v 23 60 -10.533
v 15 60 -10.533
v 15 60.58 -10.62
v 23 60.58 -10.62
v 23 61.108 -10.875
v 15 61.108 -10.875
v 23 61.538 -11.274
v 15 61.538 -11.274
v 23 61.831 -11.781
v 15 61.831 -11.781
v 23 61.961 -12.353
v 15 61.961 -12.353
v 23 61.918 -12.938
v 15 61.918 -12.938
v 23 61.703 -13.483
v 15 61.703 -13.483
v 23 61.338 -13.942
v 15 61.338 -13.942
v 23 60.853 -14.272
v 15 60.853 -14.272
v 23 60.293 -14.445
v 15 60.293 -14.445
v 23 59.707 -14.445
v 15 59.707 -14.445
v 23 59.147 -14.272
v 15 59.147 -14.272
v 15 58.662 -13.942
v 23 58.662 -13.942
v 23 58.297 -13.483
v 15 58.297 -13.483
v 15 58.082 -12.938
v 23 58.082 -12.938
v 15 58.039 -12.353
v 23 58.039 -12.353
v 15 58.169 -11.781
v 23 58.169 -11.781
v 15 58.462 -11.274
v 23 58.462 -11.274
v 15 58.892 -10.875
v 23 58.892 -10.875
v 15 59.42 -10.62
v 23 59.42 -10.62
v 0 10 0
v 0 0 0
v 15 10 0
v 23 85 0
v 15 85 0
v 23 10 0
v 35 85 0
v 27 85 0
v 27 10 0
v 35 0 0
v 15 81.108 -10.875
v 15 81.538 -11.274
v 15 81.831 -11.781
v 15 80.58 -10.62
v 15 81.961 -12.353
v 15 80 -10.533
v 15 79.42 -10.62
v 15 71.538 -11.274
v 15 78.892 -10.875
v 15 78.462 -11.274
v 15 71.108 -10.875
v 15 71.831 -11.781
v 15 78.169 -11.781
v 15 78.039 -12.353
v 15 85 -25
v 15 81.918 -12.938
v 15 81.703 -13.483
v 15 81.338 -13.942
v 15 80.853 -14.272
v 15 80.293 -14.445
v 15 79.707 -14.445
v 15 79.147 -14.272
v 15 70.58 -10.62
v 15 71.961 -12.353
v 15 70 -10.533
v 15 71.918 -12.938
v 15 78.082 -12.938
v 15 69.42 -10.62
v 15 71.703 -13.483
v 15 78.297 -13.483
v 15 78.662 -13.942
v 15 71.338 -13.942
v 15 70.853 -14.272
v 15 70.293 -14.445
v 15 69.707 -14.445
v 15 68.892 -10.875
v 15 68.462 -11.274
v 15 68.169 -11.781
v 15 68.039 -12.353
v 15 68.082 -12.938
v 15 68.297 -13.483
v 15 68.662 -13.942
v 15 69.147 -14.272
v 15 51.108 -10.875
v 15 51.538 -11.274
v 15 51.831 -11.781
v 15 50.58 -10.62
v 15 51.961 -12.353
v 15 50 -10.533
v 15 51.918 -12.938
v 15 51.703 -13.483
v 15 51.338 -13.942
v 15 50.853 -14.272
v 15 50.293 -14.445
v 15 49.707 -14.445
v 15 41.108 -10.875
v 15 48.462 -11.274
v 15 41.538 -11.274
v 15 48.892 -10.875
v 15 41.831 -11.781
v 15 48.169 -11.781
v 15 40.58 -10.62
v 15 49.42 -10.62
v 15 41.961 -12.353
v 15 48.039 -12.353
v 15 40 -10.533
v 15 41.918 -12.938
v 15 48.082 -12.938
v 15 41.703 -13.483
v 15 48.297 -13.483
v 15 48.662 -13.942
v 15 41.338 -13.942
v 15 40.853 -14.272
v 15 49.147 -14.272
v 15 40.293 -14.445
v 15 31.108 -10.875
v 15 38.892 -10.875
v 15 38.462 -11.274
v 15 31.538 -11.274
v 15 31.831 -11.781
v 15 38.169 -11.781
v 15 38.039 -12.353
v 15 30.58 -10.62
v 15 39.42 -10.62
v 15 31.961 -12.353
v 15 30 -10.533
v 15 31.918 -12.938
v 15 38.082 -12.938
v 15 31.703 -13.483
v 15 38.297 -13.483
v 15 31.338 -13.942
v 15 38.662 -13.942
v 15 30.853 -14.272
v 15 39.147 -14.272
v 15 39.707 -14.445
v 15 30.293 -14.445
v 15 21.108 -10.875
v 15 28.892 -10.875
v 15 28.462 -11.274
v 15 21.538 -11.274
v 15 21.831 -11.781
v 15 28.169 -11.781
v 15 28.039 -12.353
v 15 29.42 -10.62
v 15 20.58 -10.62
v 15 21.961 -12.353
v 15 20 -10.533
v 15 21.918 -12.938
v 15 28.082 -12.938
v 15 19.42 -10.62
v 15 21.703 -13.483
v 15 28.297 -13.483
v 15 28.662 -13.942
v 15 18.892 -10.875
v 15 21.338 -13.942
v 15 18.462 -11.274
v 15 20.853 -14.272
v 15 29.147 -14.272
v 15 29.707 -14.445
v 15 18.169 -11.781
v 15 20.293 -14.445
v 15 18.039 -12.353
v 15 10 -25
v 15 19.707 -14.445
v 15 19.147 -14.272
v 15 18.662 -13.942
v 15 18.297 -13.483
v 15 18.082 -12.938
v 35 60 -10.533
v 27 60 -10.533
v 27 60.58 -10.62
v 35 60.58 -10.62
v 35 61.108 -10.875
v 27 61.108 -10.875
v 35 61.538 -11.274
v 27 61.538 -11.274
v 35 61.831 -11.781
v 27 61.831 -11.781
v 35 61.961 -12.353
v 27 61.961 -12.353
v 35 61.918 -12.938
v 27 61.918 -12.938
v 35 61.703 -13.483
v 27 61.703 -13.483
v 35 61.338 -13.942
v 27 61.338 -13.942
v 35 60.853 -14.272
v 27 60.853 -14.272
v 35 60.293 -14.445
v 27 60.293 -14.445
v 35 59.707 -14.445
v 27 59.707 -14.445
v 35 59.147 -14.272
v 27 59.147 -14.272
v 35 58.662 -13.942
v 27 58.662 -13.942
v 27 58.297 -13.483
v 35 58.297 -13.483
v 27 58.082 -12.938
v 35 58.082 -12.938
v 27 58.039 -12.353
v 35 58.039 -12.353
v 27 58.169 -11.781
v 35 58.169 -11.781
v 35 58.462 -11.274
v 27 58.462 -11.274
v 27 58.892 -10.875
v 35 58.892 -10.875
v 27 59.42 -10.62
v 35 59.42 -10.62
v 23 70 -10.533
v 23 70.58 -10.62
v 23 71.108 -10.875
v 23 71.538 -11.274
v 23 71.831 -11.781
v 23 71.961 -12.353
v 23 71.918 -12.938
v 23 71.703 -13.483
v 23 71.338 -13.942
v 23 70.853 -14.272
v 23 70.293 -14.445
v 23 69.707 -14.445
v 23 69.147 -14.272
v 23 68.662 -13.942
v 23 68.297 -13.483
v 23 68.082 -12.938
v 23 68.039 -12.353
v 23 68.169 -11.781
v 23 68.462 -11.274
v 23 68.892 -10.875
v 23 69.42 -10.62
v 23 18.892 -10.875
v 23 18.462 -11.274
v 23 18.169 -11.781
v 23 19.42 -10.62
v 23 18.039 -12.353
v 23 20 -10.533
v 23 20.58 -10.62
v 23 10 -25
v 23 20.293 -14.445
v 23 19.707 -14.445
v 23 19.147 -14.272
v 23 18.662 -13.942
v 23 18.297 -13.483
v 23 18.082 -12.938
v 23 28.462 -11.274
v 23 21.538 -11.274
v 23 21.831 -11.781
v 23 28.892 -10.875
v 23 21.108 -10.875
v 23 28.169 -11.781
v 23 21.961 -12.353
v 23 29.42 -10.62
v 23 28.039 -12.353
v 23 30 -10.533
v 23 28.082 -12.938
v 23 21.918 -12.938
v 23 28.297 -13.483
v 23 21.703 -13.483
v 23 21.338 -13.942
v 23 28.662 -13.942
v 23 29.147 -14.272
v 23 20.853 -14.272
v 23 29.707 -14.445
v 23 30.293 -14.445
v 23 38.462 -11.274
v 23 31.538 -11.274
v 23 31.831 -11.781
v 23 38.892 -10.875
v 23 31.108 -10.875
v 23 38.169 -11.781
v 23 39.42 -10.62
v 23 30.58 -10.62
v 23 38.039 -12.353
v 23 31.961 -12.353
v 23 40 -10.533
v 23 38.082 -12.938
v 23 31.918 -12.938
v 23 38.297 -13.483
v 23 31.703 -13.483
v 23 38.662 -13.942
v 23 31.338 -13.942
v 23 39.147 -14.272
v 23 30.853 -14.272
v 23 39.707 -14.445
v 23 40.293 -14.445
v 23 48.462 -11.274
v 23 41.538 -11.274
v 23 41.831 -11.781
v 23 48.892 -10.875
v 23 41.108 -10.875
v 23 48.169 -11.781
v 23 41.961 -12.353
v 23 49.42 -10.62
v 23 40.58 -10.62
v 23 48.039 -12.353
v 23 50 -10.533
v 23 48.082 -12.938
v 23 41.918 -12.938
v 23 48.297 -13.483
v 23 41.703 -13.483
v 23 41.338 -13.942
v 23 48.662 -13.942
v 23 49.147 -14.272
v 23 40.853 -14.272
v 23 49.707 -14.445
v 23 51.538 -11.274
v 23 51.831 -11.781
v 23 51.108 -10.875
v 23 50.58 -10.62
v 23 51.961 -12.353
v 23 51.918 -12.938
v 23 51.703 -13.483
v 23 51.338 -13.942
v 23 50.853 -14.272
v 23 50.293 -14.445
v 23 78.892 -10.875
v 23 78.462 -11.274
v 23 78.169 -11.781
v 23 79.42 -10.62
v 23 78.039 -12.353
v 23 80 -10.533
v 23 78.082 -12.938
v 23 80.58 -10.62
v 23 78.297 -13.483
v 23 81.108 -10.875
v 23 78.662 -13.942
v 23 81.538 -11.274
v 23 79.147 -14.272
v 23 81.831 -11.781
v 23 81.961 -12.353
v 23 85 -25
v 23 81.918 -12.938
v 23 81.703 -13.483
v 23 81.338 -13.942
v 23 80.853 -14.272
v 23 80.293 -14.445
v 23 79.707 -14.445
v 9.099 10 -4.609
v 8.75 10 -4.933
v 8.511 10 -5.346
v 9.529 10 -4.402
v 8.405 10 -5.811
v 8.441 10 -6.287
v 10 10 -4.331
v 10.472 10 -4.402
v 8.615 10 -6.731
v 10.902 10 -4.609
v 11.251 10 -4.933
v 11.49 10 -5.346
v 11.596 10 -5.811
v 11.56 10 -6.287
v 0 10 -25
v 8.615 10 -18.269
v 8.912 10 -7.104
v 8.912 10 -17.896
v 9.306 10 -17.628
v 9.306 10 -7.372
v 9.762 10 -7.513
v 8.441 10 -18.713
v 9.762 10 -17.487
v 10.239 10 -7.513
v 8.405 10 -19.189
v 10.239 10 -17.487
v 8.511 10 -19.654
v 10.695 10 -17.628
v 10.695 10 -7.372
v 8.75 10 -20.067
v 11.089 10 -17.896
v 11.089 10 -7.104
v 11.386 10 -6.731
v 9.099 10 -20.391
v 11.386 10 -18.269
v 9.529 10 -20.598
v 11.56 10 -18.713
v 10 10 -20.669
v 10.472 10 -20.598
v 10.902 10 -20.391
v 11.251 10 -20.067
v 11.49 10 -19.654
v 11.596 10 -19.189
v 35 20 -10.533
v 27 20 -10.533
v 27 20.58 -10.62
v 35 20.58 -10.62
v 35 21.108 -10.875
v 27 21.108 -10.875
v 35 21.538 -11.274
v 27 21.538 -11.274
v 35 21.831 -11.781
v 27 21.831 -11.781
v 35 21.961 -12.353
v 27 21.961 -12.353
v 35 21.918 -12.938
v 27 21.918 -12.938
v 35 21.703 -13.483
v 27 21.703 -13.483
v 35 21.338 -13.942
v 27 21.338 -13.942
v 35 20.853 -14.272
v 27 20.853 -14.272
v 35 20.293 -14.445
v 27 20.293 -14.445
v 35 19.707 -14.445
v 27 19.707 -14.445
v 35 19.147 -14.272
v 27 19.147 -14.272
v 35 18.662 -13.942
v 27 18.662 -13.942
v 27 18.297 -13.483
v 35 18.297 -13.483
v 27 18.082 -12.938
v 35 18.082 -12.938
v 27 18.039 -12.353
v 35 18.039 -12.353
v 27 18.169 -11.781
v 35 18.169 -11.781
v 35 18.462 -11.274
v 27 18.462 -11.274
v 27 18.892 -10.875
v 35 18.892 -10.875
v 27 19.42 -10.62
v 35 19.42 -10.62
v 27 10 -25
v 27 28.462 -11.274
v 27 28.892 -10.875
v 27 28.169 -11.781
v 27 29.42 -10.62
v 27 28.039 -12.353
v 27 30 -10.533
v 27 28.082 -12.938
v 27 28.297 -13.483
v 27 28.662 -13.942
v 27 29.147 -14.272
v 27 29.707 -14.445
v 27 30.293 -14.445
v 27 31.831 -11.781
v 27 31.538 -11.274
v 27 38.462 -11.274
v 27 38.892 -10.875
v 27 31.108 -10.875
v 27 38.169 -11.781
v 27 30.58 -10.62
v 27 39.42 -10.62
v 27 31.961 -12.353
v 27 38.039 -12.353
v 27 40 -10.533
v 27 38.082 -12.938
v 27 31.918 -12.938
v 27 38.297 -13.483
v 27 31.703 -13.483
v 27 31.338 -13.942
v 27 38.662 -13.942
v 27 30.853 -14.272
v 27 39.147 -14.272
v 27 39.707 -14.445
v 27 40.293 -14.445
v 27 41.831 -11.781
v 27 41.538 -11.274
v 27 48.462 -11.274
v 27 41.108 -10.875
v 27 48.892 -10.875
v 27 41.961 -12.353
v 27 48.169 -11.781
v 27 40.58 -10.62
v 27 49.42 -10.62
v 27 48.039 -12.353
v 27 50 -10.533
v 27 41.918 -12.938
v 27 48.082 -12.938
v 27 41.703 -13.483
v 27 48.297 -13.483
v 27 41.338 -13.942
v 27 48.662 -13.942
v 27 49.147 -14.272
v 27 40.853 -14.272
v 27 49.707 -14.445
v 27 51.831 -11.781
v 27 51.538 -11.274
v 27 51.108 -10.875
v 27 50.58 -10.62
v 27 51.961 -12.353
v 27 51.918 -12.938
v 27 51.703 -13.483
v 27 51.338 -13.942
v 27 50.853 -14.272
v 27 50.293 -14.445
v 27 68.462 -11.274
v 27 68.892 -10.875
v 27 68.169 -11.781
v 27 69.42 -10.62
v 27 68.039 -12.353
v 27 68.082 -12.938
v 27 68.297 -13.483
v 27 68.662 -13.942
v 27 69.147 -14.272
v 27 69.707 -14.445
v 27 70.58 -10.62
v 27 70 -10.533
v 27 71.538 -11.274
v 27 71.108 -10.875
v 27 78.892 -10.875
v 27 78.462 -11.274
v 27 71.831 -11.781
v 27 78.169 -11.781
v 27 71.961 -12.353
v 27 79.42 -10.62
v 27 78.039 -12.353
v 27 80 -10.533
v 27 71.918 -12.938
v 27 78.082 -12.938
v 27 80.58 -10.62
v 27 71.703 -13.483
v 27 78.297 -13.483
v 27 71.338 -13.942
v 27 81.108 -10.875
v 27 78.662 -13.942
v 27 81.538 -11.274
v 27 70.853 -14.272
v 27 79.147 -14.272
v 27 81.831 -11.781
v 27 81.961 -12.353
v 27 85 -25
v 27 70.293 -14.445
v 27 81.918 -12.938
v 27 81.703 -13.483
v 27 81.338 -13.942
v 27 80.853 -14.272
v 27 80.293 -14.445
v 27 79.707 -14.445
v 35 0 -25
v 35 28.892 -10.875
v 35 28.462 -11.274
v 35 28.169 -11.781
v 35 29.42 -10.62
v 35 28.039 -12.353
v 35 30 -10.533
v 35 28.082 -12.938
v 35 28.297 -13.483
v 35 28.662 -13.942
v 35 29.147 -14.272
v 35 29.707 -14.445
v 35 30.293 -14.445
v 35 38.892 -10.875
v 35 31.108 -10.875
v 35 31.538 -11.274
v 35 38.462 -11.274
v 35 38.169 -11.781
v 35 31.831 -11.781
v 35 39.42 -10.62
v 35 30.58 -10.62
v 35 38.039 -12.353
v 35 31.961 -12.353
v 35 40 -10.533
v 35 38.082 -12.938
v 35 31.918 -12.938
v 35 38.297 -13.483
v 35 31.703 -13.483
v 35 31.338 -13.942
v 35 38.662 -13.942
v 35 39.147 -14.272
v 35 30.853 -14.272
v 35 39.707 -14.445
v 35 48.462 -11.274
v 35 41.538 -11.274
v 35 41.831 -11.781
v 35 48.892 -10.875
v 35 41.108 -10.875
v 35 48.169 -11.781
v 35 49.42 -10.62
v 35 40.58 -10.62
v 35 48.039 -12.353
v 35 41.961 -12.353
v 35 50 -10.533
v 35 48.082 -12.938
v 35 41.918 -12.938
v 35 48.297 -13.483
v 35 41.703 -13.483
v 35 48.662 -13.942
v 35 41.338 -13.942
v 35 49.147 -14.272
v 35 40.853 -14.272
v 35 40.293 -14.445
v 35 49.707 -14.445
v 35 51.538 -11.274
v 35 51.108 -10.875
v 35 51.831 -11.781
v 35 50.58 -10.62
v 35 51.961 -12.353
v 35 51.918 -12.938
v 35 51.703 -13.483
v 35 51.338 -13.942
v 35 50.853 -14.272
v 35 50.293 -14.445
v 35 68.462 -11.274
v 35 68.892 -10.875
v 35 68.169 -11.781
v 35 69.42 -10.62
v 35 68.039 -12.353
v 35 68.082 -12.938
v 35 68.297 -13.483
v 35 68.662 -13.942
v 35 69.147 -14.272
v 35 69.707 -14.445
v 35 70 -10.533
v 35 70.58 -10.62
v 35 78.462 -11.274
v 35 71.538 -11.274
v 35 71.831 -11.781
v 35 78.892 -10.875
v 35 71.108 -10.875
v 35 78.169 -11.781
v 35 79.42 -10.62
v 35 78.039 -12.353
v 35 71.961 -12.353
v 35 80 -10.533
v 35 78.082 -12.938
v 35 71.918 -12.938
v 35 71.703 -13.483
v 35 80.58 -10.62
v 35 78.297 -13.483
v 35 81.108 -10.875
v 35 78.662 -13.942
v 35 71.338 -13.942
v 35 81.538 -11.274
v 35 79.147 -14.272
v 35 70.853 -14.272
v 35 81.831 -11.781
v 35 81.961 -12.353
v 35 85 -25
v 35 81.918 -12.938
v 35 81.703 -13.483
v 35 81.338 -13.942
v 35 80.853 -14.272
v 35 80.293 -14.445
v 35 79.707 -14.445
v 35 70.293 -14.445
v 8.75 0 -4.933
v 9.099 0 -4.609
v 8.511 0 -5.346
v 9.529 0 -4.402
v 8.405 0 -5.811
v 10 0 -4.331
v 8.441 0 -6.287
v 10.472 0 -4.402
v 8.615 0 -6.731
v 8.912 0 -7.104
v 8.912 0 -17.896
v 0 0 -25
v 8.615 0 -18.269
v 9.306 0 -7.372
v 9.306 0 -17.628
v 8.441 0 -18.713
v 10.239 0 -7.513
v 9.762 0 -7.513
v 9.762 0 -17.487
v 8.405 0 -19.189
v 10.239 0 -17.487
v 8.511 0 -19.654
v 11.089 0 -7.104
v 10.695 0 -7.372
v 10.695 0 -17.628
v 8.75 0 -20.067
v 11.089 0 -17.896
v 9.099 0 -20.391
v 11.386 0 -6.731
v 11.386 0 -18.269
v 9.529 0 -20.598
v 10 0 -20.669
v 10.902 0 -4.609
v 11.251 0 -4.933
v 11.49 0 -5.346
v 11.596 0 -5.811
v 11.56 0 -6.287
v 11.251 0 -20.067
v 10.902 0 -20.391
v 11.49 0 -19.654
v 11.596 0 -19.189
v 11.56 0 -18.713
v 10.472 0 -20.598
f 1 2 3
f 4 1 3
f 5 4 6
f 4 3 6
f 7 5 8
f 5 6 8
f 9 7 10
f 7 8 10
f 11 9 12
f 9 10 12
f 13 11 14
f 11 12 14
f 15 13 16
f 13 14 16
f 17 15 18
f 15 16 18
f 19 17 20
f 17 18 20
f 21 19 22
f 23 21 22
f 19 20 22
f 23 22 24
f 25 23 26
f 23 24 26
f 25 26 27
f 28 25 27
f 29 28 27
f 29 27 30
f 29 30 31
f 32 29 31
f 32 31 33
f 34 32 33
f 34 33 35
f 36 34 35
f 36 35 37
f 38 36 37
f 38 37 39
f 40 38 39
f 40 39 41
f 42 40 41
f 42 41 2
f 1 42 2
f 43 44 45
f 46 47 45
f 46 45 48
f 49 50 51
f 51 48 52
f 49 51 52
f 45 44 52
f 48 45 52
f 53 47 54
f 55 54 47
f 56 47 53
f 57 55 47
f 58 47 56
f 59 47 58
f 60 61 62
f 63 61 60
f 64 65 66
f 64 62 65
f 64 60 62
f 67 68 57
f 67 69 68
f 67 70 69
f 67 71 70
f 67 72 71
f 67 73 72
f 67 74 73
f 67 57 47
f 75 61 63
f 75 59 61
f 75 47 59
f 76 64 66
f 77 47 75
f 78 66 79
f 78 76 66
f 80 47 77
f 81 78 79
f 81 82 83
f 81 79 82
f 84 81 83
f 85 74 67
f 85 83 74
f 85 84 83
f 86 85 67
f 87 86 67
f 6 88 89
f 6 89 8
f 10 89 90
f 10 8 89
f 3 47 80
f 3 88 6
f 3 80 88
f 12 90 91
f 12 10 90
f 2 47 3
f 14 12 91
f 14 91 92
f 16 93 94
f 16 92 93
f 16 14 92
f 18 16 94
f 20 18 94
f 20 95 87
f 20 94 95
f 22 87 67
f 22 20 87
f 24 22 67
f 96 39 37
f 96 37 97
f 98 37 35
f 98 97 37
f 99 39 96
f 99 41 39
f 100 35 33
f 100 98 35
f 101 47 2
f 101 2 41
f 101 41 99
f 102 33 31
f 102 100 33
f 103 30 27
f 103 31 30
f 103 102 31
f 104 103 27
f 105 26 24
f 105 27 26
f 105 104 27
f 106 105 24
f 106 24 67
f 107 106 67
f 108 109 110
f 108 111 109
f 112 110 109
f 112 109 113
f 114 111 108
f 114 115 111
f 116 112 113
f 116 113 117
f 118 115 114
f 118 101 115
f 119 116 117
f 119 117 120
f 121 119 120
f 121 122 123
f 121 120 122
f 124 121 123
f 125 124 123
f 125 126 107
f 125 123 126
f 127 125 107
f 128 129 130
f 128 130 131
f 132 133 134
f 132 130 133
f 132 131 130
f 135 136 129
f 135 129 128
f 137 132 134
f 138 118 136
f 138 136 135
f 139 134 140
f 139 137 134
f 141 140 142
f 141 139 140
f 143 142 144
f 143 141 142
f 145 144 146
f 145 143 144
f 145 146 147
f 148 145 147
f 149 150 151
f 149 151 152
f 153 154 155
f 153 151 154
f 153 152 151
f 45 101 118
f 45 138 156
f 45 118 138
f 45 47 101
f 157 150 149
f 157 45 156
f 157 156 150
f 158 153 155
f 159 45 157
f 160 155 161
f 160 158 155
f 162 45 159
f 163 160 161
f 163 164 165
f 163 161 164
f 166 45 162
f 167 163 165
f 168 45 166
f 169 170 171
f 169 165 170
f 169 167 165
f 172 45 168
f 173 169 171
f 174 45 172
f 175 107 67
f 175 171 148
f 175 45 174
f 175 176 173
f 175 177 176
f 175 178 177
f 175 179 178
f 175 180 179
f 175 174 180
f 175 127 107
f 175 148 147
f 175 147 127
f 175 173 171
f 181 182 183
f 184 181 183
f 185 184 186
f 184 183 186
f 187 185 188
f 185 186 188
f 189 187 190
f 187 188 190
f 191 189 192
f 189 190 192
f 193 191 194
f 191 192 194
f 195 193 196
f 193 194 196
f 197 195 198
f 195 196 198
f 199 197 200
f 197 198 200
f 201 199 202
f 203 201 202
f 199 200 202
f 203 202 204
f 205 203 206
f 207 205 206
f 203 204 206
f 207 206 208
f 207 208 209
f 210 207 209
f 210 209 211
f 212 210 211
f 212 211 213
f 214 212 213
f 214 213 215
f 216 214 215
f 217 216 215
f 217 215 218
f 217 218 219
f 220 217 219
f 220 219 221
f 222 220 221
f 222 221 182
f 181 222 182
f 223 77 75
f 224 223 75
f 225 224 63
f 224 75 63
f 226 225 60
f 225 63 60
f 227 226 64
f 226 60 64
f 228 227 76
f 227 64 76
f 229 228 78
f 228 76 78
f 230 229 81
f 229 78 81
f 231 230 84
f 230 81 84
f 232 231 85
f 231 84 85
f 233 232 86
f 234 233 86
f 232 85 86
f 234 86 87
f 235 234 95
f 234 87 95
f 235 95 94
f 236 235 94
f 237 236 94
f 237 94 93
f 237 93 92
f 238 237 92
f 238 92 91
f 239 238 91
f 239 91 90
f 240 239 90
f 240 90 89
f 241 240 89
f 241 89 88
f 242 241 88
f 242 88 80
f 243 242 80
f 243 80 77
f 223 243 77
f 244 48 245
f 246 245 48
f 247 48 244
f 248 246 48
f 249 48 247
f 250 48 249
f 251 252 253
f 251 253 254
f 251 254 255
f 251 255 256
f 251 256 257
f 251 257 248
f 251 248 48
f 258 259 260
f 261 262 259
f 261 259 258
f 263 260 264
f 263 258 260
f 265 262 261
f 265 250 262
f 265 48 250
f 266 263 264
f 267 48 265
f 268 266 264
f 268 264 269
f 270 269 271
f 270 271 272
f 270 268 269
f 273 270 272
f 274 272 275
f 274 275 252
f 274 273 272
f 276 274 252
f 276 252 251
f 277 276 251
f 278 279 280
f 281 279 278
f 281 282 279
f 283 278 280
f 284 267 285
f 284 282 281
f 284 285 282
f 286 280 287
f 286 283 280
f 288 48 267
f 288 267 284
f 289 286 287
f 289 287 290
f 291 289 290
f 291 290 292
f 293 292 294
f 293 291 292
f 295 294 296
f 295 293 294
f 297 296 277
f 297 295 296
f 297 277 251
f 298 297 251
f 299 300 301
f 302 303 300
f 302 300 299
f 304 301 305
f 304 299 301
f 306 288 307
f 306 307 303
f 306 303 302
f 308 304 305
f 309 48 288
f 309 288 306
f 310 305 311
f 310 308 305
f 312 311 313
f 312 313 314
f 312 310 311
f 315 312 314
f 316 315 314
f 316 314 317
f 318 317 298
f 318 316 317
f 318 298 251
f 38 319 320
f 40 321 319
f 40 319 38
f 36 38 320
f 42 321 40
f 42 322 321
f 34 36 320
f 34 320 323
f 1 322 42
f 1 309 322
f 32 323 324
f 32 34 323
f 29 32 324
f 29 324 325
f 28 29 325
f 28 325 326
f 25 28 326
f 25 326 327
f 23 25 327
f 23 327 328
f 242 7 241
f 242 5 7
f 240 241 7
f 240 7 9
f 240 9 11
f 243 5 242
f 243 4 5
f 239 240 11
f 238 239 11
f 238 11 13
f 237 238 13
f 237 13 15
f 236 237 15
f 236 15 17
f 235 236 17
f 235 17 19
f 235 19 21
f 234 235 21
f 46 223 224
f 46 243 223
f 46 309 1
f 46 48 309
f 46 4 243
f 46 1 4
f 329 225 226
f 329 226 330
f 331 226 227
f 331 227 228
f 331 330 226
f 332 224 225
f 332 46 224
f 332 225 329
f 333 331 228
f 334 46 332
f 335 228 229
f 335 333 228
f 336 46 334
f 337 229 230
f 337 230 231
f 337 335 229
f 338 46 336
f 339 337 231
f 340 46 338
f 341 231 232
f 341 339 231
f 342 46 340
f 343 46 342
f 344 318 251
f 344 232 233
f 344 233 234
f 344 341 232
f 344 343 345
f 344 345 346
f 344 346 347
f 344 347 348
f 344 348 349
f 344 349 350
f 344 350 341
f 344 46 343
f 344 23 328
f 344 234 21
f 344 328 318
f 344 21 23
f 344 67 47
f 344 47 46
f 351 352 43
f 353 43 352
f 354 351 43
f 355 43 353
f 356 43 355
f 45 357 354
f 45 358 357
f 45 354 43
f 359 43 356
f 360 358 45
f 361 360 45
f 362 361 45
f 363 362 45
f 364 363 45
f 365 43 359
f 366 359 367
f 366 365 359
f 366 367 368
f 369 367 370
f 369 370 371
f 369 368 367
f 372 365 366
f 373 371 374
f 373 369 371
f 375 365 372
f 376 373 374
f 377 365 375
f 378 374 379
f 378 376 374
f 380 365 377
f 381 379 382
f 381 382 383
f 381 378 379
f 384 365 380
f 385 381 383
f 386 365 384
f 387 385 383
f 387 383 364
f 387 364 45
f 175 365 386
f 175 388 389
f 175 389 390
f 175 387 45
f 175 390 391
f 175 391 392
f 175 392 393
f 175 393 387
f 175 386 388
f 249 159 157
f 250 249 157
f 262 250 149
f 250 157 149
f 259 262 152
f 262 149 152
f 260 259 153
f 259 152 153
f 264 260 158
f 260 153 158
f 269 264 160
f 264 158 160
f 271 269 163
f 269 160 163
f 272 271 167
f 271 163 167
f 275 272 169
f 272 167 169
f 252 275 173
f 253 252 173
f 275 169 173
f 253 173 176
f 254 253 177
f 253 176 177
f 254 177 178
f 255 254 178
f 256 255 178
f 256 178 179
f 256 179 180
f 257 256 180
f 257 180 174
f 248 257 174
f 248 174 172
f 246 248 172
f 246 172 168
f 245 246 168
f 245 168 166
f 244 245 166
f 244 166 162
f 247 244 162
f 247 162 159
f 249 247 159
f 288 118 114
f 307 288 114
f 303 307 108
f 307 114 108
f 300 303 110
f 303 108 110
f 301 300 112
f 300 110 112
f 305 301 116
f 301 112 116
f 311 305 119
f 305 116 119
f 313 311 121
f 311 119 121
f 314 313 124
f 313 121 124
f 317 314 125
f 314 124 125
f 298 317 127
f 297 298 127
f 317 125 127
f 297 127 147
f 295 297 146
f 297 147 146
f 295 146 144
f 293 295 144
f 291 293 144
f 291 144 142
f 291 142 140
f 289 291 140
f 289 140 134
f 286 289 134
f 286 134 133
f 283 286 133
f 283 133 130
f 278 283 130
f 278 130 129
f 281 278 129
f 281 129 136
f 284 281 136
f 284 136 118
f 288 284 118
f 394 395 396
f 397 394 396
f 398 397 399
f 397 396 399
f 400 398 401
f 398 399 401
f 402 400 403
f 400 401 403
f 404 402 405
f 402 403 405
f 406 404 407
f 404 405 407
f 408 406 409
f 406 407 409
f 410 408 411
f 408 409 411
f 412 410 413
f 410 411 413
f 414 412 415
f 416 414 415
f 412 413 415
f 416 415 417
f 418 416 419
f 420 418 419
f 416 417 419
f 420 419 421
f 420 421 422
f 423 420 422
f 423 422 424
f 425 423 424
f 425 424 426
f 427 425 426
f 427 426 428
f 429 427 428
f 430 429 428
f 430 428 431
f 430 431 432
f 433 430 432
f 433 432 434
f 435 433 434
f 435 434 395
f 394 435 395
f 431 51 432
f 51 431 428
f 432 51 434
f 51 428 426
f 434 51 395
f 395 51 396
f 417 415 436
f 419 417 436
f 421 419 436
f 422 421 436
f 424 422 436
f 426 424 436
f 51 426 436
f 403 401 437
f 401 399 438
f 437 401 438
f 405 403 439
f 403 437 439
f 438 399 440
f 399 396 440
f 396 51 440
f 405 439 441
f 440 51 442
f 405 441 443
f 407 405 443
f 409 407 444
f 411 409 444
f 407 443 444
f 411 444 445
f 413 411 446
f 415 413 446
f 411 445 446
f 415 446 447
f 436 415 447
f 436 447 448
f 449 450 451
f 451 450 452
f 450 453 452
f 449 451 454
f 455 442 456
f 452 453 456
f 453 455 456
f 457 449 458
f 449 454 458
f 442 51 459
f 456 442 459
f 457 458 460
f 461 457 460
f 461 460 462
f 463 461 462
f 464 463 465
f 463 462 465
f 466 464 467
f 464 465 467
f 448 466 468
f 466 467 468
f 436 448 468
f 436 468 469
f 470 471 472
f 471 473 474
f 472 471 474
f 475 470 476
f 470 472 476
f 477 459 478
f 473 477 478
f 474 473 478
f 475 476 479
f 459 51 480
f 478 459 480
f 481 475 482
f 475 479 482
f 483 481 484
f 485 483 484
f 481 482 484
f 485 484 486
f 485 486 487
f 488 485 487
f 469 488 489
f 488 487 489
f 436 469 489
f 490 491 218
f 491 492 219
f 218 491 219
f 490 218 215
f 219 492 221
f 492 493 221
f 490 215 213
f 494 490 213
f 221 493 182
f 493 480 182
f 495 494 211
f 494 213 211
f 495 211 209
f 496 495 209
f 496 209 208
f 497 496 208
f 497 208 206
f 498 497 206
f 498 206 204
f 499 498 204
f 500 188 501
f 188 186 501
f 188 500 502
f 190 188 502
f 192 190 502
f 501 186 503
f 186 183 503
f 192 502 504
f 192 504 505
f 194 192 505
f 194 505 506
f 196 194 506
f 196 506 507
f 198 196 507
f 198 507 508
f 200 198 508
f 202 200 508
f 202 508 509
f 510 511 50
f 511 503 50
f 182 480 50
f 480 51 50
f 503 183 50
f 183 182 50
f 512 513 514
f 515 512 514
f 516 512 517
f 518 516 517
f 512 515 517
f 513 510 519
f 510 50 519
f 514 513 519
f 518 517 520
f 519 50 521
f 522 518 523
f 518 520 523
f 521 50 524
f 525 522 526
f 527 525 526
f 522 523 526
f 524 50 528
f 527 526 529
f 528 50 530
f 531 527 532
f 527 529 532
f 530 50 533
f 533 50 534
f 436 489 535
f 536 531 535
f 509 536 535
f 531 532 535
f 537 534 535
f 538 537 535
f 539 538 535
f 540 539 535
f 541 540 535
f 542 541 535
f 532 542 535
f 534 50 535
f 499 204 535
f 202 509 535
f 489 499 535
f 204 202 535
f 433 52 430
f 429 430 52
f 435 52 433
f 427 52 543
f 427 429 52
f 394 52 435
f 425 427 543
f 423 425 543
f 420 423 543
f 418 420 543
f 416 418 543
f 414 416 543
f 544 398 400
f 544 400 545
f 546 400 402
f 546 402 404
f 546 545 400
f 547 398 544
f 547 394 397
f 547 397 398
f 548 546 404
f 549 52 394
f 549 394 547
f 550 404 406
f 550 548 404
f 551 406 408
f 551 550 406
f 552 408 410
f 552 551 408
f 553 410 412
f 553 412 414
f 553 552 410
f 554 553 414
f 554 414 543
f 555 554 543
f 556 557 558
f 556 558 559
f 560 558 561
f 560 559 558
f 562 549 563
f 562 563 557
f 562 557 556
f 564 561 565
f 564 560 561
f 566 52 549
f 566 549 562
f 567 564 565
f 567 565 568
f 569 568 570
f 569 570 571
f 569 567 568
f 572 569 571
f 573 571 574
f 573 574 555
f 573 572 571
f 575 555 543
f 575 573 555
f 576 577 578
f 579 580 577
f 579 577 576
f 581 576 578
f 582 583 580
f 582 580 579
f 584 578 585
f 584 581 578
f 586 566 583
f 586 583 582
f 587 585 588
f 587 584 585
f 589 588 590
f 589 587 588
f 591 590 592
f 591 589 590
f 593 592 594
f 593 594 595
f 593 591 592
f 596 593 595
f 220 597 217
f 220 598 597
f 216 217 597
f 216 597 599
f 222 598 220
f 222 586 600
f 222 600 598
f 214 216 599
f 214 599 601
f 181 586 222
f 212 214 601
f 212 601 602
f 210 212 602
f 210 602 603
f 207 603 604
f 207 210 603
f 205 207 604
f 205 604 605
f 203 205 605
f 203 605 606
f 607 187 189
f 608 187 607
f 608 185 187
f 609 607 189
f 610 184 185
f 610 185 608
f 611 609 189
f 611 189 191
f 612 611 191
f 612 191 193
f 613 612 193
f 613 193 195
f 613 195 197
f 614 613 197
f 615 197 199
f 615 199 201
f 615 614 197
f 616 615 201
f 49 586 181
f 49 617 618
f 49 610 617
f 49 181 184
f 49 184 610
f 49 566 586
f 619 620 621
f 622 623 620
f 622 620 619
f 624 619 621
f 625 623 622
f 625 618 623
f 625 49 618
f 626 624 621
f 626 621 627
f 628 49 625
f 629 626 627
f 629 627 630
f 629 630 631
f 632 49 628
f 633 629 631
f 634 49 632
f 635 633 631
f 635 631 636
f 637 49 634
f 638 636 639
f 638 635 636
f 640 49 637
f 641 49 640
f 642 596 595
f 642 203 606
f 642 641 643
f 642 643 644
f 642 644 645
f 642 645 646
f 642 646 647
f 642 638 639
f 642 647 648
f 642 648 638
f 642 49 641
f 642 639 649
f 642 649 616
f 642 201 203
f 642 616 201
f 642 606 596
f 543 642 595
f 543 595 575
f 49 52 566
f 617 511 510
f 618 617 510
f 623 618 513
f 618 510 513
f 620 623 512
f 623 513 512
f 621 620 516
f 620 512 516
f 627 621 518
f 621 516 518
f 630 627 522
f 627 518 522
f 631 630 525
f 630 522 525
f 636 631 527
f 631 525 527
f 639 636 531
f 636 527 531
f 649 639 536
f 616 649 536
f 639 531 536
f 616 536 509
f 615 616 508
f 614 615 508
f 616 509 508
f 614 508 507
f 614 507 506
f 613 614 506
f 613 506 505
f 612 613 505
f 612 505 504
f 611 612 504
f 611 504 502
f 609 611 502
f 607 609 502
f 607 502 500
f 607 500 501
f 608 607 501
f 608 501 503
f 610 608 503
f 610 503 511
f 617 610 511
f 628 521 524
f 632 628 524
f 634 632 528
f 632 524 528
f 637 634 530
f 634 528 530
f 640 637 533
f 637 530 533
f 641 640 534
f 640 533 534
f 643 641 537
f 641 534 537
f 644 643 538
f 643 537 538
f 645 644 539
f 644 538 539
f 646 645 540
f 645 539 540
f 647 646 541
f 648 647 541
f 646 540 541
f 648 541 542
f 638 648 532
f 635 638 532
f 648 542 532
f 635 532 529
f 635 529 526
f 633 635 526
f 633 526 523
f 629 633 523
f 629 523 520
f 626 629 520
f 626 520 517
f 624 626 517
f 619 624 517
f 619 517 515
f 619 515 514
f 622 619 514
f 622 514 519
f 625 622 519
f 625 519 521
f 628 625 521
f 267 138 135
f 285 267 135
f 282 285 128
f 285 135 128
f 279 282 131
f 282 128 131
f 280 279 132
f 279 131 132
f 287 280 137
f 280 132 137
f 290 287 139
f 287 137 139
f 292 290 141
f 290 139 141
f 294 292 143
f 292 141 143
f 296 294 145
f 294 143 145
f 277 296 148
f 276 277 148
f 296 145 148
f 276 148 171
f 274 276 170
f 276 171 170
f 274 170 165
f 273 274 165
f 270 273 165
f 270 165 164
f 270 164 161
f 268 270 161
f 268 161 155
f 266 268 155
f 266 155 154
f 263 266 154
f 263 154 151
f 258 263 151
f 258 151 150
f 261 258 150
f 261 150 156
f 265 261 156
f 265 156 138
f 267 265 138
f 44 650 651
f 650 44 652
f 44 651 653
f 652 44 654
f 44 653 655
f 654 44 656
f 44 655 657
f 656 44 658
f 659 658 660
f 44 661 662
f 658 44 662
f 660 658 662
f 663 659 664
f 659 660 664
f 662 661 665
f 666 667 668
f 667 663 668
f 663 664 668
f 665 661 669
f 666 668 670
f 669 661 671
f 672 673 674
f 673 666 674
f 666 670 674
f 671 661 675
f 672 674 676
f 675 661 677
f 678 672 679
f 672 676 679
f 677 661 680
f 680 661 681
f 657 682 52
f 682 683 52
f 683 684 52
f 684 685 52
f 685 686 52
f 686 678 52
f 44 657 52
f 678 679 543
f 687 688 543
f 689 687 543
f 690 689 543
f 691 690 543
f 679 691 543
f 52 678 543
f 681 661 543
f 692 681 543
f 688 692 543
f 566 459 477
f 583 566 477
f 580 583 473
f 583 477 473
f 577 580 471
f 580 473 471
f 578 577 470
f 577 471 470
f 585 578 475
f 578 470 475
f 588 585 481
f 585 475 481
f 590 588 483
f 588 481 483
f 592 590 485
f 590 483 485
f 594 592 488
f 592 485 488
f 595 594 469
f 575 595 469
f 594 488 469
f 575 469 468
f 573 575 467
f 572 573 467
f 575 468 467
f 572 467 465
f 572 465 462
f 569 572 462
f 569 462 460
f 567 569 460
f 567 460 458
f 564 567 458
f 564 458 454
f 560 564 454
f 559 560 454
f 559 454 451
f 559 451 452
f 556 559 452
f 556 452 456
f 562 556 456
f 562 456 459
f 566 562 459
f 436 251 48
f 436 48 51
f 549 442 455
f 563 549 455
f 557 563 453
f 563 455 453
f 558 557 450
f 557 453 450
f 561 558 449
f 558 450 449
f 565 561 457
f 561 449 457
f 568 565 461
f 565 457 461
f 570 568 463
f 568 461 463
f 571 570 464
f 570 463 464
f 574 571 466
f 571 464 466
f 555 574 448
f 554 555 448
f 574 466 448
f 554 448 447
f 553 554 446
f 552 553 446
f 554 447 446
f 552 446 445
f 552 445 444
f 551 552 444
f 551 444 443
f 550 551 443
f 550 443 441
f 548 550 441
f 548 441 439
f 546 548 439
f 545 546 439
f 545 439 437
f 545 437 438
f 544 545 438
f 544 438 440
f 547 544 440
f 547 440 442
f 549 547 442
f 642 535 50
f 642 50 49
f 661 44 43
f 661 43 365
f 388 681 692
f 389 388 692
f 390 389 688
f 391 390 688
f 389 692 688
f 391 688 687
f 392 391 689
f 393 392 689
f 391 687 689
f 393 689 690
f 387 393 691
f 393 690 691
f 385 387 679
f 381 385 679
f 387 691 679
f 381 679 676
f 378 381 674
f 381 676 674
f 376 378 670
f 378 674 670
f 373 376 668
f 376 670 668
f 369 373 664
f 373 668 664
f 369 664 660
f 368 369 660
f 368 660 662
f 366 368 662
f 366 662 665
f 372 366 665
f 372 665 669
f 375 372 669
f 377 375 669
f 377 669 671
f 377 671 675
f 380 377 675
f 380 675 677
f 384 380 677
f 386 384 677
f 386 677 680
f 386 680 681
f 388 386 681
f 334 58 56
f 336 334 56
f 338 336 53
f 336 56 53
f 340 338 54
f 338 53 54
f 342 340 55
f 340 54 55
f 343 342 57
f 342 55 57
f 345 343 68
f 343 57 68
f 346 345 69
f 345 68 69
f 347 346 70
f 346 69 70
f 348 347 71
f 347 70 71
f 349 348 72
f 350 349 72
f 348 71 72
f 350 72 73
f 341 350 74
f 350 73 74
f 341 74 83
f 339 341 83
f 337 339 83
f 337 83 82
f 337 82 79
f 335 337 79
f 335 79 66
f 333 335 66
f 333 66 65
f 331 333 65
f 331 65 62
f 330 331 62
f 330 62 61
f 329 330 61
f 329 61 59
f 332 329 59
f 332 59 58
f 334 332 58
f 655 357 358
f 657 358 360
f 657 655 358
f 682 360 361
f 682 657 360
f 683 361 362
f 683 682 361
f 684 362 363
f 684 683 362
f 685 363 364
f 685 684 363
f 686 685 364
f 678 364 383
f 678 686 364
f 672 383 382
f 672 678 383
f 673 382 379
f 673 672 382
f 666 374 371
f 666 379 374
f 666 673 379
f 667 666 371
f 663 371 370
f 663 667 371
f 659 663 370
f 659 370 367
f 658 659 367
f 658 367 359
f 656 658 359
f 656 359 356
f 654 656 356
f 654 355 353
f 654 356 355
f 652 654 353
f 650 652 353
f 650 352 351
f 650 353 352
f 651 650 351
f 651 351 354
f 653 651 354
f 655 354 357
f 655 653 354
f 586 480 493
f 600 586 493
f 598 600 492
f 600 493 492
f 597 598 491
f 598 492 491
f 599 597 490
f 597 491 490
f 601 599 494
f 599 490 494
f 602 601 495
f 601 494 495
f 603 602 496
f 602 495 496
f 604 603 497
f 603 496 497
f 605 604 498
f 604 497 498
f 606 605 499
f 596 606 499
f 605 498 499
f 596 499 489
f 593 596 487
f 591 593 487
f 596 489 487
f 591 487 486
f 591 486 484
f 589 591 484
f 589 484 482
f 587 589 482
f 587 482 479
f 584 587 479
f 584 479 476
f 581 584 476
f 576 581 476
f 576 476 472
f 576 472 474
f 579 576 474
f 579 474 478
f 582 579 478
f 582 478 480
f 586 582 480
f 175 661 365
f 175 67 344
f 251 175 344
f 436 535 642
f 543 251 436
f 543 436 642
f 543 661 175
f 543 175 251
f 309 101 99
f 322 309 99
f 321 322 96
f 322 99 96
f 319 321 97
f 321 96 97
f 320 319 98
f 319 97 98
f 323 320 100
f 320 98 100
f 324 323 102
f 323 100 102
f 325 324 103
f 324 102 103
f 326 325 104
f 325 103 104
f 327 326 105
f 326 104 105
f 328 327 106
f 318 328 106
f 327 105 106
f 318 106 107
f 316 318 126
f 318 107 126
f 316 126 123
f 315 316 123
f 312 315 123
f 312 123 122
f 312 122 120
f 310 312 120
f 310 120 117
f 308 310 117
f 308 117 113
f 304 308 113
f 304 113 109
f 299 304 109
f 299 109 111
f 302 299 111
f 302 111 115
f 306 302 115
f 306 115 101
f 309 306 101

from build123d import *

# Parameters (mm, degrees)
SKETCH1_W           = 50
SKETCH1_H           = 25
BOSS_EXTRUDE1_DEPTH = 10
SKETCH2_W           = 20
SKETCH2_H           = 25
BOSS_EXTRUDE2_DEPTH = 75
SKETCH3_W           = 4
SKETCH3_H           = 25
CUT_EXTRUDE1_DEPTH  = 75
SKETCH4_R           = 1.966955022
CUT_EXTRUDE2_DEPTH  = 96.262794416
LPATTERN1_COUNT     = 7
LPATTERN1_PITCH     = 10
SKETCH5_W           = 15
SKETCH5_H           = 25
CUT_EXTRUDE3_DEPTH  = 94.541434669
SKETCH6_R           = 1.6
CUT_EXTRUDE4_DEPTH  = 96.262794416


with BuildPart() as part:
    # Sketch1 → Boss-Extrude1 (new body)
    with BuildSketch(Plane(origin=(0, 0, 0), x_dir=(1, 0, 0), z_dir=(0, 1, 0))):
        with Locations((25, 12.5)):
            Rectangle(SKETCH1_W, SKETCH1_H)
    extrude(amount=BOSS_EXTRUDE1_DEPTH)

    # Sketch2 → Boss-Extrude2 (add)
    with BuildSketch(Plane(origin=(0, 10, 0), x_dir=(1, 0, 0), z_dir=(0, 1, 0))):
        with Locations((25, 12.5)):
            Rectangle(SKETCH2_W, SKETCH2_H)
    extrude(amount=BOSS_EXTRUDE2_DEPTH)

    # Sketch3 → Cut-Extrude1 (cut)
    with BuildSketch(Plane(origin=(0, 85, 0), x_dir=(1, 0, 0), z_dir=(0, 1, 0))):
        with Locations((25, 12.5)):
            Rectangle(SKETCH3_W, SKETCH3_H)
    extrude(amount=-CUT_EXTRUDE1_DEPTH, mode=Mode.SUBTRACT)

    # Sketch4 → Cut-Extrude2 (cut, through all)
    with BuildSketch(Plane.ZY.offset(-15)):
        with Locations((-12.5, 80)):
            Circle(SKETCH4_R)
    cut_extrude2 = extrude(amount=-CUT_EXTRUDE2_DEPTH, mode=Mode.SUBTRACT)

    # LPattern1: Cut-Extrude2 ×7
    with Locations(*[(0, -i * LPATTERN1_PITCH, 0) for i in range(1, LPATTERN1_COUNT)]):
        add(cut_extrude2, mode=Mode.SUBTRACT)

    # Sketch5 → Cut-Extrude3 (cut, through all)
    with BuildSketch(Plane(origin=(0, 10, 0), x_dir=(1, 0, 0), z_dir=(0, 1, 0))):
        with Locations((42.5, 12.5)):
            Rectangle(SKETCH5_W, SKETCH5_H)
    extrude(amount=-CUT_EXTRUDE3_DEPTH, mode=Mode.SUBTRACT)

    # Sketch6 → Cut-Extrude4 (cut, through all)
    with BuildSketch(Plane.XZ):
        with Locations(Location((10.000440006, -19.069369087, 0), (0, 0, 270))):
            Circle(SKETCH6_R)
    cut_extrude4 = extrude(amount=-CUT_EXTRUDE4_DEPTH, mode=Mode.SUBTRACT)

    # Mirror1: Cut-Extrude4 across plane
    add(cut_extrude4.mirror(Plane.XY.offset(-12.5)), mode=Mode.SUBTRACT)


solid = part.part
